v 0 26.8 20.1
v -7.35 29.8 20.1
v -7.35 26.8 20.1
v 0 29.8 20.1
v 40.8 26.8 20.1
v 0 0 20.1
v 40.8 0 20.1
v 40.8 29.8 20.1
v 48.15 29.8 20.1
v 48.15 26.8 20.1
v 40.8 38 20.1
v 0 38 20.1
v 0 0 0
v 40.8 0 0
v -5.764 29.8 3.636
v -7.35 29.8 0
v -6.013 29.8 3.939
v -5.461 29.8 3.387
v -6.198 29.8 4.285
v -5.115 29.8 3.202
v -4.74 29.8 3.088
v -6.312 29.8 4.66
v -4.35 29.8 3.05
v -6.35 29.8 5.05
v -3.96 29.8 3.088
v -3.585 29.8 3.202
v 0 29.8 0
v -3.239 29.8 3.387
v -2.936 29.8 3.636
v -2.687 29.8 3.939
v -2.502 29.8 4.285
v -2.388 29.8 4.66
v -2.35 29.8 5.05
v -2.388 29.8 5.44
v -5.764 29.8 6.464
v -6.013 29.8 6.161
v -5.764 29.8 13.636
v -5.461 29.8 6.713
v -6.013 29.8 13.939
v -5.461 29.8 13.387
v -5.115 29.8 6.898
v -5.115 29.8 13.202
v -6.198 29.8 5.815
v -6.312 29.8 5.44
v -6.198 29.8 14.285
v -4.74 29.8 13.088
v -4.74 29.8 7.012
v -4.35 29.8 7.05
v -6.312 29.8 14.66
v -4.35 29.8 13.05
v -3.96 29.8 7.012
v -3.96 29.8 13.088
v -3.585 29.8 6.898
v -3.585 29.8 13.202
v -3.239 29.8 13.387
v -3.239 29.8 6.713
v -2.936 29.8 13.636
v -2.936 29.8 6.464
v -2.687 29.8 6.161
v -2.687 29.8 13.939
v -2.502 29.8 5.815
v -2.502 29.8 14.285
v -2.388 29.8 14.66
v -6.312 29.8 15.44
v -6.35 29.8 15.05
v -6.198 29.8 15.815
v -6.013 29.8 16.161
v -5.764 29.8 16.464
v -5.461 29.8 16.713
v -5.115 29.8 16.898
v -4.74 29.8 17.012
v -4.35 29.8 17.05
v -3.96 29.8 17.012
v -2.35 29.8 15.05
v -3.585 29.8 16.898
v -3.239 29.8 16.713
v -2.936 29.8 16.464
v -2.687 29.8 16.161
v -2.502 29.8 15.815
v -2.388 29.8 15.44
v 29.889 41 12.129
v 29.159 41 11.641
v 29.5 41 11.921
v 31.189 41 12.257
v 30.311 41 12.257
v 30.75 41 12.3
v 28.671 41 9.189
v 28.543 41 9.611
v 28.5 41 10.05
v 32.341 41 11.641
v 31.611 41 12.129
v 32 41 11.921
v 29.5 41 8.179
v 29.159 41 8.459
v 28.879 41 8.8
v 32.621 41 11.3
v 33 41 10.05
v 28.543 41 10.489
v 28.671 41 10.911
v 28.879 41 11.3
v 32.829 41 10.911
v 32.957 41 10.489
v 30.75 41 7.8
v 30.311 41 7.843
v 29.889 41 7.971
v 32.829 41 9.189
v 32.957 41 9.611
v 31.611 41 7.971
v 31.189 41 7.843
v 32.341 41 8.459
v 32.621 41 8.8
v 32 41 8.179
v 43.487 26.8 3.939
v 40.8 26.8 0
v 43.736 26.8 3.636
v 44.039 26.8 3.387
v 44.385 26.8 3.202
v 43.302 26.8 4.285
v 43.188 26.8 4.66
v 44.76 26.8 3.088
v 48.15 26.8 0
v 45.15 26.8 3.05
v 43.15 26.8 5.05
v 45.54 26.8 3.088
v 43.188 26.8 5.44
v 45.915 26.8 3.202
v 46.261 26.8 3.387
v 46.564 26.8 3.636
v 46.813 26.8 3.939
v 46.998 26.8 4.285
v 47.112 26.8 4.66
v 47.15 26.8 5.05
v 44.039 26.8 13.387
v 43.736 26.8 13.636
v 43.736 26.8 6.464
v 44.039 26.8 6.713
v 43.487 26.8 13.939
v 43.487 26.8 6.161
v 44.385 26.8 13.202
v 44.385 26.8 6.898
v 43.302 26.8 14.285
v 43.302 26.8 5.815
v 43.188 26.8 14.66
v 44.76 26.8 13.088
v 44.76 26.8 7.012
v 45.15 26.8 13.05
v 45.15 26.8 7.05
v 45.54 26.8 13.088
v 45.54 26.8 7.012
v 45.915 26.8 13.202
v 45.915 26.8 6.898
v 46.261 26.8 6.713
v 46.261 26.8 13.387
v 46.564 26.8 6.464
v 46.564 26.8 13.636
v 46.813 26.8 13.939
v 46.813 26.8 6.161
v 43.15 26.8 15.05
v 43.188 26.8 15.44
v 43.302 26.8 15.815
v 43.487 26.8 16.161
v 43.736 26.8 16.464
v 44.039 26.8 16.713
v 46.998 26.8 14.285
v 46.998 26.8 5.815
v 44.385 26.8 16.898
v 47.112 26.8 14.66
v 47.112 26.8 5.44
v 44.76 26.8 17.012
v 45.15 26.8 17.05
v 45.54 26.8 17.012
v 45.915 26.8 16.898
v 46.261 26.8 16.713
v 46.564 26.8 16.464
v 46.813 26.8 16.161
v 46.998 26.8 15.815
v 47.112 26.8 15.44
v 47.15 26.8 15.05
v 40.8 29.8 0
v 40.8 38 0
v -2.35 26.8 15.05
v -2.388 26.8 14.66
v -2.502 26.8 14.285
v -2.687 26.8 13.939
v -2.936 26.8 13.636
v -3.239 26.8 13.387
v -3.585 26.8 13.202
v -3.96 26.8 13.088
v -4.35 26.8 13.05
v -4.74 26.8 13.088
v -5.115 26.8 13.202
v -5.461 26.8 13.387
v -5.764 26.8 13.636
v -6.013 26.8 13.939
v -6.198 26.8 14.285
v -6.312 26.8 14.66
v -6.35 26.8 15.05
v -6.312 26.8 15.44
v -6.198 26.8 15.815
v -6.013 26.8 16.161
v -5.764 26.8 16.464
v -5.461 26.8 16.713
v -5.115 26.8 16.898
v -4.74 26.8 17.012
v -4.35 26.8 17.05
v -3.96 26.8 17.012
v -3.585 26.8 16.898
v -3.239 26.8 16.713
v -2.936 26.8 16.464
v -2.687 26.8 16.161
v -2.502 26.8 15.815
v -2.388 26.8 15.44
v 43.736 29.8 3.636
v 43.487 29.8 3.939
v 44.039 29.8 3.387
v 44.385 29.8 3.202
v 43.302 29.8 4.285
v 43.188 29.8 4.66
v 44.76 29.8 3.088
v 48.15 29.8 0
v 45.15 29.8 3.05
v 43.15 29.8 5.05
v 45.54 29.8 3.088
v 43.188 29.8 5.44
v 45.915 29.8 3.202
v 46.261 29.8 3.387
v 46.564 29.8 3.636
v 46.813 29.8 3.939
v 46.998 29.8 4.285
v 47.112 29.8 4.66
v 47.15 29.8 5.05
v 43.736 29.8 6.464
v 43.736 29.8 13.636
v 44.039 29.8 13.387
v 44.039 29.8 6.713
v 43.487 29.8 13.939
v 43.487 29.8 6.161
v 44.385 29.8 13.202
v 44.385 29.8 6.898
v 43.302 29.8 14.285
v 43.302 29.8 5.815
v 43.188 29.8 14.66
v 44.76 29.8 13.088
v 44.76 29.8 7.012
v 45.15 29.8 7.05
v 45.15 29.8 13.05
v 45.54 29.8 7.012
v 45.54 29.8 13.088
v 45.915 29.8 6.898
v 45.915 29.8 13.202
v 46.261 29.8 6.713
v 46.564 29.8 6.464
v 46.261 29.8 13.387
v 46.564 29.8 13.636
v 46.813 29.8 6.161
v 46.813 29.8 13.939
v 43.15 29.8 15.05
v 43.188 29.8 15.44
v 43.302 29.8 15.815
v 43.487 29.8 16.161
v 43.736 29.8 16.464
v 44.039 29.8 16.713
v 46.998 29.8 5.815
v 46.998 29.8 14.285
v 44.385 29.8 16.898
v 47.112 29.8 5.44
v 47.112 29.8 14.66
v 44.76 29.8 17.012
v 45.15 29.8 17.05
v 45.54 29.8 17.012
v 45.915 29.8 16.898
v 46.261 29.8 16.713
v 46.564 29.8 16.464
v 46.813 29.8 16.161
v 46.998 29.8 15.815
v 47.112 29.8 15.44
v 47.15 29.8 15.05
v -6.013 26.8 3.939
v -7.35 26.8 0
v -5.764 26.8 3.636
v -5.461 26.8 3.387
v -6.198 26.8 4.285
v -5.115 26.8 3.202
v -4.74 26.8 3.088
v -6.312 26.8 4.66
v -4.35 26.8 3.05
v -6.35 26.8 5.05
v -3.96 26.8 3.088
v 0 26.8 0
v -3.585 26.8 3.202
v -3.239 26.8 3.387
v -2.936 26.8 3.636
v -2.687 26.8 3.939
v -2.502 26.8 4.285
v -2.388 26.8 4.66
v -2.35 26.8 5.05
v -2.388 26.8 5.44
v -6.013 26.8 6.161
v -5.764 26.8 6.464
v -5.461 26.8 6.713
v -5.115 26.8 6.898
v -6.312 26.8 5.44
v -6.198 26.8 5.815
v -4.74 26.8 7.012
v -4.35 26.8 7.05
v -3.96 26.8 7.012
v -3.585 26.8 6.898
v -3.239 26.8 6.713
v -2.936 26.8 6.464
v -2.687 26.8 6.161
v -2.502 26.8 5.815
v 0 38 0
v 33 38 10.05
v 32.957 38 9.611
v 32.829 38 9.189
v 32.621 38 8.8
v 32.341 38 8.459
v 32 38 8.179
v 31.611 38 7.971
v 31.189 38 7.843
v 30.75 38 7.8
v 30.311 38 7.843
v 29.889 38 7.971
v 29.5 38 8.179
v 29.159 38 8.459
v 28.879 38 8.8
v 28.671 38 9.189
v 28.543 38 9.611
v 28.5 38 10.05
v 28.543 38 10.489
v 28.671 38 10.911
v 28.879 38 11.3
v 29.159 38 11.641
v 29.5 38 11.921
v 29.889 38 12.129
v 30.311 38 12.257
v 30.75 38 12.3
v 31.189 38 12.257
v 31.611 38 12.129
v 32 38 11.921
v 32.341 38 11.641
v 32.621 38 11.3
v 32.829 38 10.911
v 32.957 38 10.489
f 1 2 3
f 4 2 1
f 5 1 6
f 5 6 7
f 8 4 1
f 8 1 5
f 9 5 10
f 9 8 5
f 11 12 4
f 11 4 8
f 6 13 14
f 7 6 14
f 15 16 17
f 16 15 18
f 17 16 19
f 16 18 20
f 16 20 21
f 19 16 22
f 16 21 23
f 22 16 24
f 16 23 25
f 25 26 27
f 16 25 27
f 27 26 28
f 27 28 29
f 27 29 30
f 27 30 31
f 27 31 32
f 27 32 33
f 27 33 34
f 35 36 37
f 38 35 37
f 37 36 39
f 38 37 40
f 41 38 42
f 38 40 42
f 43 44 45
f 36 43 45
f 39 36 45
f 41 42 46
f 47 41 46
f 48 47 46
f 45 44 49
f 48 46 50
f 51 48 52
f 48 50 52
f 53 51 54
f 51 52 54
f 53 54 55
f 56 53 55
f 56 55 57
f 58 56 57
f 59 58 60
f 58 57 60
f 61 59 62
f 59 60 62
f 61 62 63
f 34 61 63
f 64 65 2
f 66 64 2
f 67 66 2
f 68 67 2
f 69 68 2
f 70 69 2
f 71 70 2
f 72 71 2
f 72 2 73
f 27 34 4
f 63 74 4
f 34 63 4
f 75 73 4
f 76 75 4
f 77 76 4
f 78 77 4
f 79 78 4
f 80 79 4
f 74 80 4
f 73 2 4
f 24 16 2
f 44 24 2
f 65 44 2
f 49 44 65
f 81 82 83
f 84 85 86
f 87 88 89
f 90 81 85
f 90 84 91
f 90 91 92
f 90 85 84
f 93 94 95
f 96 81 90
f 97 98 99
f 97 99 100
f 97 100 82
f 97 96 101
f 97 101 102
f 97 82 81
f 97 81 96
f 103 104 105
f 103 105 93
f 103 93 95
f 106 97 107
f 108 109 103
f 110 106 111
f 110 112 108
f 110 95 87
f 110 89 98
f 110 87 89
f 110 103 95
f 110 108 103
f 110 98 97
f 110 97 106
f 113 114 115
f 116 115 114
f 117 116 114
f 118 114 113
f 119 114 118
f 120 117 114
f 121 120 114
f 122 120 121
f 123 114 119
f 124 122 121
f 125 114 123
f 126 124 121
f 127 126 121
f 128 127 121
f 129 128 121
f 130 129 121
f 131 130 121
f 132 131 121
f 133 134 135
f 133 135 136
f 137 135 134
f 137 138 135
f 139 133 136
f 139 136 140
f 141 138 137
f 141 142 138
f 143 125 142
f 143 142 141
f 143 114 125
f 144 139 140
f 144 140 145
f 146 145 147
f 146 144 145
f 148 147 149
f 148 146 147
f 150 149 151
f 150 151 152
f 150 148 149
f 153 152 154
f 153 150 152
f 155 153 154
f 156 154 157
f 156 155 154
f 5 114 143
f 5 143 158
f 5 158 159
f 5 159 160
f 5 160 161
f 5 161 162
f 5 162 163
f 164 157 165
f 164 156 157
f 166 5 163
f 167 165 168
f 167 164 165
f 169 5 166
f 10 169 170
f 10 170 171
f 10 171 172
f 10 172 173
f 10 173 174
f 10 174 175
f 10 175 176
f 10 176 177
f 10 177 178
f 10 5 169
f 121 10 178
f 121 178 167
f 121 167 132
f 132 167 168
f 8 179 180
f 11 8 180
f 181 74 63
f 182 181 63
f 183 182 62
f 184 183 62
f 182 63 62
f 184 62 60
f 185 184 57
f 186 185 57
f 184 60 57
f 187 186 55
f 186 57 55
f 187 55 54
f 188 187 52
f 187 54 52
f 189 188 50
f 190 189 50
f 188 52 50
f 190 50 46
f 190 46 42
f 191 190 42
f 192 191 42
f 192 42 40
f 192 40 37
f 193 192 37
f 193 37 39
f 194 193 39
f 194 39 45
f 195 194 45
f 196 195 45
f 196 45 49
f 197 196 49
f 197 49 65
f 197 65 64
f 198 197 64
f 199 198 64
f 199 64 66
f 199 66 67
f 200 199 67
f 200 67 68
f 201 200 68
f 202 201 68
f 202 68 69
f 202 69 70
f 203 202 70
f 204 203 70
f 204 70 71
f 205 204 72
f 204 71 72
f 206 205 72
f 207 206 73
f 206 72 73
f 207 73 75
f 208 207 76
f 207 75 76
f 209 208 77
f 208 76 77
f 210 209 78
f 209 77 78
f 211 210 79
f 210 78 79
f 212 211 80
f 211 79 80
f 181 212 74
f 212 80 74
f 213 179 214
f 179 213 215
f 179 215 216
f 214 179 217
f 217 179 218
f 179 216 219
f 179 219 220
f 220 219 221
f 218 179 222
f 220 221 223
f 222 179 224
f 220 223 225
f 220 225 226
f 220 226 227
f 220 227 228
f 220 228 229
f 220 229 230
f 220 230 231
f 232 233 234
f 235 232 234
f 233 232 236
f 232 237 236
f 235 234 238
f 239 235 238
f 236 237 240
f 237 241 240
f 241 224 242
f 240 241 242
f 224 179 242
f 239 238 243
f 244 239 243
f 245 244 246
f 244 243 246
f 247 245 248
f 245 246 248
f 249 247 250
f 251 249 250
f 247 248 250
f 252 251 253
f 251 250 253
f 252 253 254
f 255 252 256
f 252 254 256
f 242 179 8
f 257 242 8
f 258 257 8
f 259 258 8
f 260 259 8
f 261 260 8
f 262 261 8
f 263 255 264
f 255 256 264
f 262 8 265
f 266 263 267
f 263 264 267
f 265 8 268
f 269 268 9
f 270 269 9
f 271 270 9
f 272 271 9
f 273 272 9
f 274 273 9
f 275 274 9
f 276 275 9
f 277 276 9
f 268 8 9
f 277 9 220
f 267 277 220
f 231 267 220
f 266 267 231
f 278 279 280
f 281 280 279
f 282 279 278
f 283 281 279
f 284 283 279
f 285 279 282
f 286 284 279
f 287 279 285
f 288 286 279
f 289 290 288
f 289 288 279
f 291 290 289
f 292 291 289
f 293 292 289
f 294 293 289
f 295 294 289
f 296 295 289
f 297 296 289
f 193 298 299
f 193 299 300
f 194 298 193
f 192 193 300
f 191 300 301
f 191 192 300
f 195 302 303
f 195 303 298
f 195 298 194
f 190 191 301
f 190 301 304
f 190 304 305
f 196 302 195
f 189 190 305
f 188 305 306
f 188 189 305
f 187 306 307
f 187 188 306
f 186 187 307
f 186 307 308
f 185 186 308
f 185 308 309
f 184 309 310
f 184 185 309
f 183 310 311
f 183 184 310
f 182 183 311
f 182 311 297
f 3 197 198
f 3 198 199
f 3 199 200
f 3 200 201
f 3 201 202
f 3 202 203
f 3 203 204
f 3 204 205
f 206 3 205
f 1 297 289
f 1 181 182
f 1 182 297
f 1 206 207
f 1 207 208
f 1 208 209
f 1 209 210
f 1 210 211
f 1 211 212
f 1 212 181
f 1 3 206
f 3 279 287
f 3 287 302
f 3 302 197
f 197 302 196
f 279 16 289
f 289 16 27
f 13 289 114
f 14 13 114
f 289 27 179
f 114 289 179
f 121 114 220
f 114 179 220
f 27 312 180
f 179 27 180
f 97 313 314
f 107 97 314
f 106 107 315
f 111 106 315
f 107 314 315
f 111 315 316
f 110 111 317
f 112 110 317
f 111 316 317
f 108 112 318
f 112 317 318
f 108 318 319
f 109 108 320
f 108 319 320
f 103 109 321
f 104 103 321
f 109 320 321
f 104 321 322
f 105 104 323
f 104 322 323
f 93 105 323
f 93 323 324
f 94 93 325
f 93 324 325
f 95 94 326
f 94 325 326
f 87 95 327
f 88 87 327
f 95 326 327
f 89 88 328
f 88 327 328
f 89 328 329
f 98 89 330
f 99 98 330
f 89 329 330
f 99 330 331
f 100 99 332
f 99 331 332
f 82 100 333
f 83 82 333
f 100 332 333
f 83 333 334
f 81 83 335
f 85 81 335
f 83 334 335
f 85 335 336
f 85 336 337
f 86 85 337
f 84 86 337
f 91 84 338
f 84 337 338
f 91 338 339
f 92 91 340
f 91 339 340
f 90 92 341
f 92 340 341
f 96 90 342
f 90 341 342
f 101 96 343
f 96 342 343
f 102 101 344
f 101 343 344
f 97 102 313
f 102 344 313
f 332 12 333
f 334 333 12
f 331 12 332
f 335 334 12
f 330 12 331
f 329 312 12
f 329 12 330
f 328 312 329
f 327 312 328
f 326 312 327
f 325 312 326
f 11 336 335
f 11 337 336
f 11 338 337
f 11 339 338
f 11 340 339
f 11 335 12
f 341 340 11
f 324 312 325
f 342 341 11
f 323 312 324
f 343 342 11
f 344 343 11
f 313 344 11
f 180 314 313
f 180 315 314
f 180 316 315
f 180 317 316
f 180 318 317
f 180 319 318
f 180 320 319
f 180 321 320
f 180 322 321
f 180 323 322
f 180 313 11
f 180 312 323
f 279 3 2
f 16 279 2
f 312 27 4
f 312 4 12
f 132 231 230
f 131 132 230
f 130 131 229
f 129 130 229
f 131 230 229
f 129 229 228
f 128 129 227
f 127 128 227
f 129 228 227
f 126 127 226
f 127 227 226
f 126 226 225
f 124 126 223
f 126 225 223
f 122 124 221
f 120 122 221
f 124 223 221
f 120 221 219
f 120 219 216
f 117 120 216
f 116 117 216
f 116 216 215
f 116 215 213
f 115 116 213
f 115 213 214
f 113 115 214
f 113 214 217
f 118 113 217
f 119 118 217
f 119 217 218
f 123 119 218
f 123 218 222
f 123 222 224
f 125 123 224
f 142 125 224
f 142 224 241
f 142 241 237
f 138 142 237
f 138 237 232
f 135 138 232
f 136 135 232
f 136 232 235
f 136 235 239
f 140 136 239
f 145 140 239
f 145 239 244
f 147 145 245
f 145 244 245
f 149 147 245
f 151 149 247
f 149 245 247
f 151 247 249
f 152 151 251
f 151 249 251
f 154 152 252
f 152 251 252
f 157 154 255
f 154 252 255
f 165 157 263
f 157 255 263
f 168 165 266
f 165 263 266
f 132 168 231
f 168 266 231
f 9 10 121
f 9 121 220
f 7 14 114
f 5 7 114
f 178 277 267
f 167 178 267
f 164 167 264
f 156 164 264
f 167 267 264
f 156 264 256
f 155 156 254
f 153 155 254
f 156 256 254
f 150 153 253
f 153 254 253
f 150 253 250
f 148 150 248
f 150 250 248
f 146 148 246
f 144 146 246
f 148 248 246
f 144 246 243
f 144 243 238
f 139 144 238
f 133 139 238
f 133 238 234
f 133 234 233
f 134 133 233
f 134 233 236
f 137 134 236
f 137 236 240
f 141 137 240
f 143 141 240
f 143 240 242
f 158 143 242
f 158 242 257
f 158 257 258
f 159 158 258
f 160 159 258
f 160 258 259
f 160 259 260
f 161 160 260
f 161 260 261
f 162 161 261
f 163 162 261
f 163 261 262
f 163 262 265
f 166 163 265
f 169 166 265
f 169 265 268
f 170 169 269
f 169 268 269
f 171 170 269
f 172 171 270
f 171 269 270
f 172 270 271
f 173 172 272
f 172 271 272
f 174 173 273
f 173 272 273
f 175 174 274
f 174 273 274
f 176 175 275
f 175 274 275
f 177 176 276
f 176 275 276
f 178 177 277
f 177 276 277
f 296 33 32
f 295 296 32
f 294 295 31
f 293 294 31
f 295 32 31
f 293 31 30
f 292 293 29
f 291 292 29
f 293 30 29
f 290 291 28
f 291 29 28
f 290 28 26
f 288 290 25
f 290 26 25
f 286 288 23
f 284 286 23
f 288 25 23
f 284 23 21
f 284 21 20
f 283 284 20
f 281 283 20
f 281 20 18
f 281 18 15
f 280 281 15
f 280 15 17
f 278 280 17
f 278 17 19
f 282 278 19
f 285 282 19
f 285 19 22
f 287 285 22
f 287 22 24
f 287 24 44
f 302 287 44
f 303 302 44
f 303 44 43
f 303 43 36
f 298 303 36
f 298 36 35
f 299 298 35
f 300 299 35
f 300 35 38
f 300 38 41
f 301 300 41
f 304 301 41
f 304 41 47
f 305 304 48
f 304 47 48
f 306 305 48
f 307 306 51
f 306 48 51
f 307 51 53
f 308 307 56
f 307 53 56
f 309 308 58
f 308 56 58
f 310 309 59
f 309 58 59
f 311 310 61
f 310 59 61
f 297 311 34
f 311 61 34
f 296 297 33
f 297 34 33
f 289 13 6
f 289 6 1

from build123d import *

# Parameters (mm, degrees)
SKETCH1_W           = 40.8
SKETCH1_H           = 38
BOSS_EXTRUDE1_DEPTH = 20.1
SKETCH2_W           = 55.5
SKETCH2_H           = 3
BOSS_EXTRUDE2_DEPTH = 20.1
SKETCH3_R           = 2
CUT_EXTRUDE1_DEPTH  = 30.8
SKETCH4_R           = 2.25
BOSS_EXTRUDE3_DEPTH = 3


with BuildPart() as part:
    # Sketch1 → Boss-Extrude1 (new body)
    with BuildSketch(Plane.XY):
        with Locations((20.4, 19)):
            Rectangle(SKETCH1_W, SKETCH1_H)
    extrude(amount=BOSS_EXTRUDE1_DEPTH)

    # Sketch2 → Boss-Extrude2 (add)
    with BuildSketch(Plane.XY.offset(20.1)):
        with Locations((20.4, 28.3)):
            Rectangle(SKETCH2_W, SKETCH2_H)
    extrude(amount=-BOSS_EXTRUDE2_DEPTH)

    # Sketch3 → Cut-Extrude1 (cut, through all)
    with BuildSketch(Plane(origin=(0, 29.8, 0), x_dir=(1, 0, 0), z_dir=(0, 1, 0))):
        with Locations((-4.35, -5.05)):
            Circle(SKETCH3_R)
        with Locations((-4.35, -15.05)):
            Circle(SKETCH3_R)
        with Locations((45.15, -15.05)):
            Circle(SKETCH3_R)
        with Locations((45.15, -5.05)):
            Circle(SKETCH3_R)
    extrude(amount=-CUT_EXTRUDE1_DEPTH, mode=Mode.SUBTRACT)

    # Sketch4 → Boss-Extrude3 (add)
    with BuildSketch(Plane(origin=(0, 38, 0), x_dir=(1, 0, 0), z_dir=(0, 1, 0))):
        with Locations((30.75, -10.05)):
            Circle(SKETCH4_R)
    extrude(amount=BOSS_EXTRUDE3_DEPTH)


solid = part.part
